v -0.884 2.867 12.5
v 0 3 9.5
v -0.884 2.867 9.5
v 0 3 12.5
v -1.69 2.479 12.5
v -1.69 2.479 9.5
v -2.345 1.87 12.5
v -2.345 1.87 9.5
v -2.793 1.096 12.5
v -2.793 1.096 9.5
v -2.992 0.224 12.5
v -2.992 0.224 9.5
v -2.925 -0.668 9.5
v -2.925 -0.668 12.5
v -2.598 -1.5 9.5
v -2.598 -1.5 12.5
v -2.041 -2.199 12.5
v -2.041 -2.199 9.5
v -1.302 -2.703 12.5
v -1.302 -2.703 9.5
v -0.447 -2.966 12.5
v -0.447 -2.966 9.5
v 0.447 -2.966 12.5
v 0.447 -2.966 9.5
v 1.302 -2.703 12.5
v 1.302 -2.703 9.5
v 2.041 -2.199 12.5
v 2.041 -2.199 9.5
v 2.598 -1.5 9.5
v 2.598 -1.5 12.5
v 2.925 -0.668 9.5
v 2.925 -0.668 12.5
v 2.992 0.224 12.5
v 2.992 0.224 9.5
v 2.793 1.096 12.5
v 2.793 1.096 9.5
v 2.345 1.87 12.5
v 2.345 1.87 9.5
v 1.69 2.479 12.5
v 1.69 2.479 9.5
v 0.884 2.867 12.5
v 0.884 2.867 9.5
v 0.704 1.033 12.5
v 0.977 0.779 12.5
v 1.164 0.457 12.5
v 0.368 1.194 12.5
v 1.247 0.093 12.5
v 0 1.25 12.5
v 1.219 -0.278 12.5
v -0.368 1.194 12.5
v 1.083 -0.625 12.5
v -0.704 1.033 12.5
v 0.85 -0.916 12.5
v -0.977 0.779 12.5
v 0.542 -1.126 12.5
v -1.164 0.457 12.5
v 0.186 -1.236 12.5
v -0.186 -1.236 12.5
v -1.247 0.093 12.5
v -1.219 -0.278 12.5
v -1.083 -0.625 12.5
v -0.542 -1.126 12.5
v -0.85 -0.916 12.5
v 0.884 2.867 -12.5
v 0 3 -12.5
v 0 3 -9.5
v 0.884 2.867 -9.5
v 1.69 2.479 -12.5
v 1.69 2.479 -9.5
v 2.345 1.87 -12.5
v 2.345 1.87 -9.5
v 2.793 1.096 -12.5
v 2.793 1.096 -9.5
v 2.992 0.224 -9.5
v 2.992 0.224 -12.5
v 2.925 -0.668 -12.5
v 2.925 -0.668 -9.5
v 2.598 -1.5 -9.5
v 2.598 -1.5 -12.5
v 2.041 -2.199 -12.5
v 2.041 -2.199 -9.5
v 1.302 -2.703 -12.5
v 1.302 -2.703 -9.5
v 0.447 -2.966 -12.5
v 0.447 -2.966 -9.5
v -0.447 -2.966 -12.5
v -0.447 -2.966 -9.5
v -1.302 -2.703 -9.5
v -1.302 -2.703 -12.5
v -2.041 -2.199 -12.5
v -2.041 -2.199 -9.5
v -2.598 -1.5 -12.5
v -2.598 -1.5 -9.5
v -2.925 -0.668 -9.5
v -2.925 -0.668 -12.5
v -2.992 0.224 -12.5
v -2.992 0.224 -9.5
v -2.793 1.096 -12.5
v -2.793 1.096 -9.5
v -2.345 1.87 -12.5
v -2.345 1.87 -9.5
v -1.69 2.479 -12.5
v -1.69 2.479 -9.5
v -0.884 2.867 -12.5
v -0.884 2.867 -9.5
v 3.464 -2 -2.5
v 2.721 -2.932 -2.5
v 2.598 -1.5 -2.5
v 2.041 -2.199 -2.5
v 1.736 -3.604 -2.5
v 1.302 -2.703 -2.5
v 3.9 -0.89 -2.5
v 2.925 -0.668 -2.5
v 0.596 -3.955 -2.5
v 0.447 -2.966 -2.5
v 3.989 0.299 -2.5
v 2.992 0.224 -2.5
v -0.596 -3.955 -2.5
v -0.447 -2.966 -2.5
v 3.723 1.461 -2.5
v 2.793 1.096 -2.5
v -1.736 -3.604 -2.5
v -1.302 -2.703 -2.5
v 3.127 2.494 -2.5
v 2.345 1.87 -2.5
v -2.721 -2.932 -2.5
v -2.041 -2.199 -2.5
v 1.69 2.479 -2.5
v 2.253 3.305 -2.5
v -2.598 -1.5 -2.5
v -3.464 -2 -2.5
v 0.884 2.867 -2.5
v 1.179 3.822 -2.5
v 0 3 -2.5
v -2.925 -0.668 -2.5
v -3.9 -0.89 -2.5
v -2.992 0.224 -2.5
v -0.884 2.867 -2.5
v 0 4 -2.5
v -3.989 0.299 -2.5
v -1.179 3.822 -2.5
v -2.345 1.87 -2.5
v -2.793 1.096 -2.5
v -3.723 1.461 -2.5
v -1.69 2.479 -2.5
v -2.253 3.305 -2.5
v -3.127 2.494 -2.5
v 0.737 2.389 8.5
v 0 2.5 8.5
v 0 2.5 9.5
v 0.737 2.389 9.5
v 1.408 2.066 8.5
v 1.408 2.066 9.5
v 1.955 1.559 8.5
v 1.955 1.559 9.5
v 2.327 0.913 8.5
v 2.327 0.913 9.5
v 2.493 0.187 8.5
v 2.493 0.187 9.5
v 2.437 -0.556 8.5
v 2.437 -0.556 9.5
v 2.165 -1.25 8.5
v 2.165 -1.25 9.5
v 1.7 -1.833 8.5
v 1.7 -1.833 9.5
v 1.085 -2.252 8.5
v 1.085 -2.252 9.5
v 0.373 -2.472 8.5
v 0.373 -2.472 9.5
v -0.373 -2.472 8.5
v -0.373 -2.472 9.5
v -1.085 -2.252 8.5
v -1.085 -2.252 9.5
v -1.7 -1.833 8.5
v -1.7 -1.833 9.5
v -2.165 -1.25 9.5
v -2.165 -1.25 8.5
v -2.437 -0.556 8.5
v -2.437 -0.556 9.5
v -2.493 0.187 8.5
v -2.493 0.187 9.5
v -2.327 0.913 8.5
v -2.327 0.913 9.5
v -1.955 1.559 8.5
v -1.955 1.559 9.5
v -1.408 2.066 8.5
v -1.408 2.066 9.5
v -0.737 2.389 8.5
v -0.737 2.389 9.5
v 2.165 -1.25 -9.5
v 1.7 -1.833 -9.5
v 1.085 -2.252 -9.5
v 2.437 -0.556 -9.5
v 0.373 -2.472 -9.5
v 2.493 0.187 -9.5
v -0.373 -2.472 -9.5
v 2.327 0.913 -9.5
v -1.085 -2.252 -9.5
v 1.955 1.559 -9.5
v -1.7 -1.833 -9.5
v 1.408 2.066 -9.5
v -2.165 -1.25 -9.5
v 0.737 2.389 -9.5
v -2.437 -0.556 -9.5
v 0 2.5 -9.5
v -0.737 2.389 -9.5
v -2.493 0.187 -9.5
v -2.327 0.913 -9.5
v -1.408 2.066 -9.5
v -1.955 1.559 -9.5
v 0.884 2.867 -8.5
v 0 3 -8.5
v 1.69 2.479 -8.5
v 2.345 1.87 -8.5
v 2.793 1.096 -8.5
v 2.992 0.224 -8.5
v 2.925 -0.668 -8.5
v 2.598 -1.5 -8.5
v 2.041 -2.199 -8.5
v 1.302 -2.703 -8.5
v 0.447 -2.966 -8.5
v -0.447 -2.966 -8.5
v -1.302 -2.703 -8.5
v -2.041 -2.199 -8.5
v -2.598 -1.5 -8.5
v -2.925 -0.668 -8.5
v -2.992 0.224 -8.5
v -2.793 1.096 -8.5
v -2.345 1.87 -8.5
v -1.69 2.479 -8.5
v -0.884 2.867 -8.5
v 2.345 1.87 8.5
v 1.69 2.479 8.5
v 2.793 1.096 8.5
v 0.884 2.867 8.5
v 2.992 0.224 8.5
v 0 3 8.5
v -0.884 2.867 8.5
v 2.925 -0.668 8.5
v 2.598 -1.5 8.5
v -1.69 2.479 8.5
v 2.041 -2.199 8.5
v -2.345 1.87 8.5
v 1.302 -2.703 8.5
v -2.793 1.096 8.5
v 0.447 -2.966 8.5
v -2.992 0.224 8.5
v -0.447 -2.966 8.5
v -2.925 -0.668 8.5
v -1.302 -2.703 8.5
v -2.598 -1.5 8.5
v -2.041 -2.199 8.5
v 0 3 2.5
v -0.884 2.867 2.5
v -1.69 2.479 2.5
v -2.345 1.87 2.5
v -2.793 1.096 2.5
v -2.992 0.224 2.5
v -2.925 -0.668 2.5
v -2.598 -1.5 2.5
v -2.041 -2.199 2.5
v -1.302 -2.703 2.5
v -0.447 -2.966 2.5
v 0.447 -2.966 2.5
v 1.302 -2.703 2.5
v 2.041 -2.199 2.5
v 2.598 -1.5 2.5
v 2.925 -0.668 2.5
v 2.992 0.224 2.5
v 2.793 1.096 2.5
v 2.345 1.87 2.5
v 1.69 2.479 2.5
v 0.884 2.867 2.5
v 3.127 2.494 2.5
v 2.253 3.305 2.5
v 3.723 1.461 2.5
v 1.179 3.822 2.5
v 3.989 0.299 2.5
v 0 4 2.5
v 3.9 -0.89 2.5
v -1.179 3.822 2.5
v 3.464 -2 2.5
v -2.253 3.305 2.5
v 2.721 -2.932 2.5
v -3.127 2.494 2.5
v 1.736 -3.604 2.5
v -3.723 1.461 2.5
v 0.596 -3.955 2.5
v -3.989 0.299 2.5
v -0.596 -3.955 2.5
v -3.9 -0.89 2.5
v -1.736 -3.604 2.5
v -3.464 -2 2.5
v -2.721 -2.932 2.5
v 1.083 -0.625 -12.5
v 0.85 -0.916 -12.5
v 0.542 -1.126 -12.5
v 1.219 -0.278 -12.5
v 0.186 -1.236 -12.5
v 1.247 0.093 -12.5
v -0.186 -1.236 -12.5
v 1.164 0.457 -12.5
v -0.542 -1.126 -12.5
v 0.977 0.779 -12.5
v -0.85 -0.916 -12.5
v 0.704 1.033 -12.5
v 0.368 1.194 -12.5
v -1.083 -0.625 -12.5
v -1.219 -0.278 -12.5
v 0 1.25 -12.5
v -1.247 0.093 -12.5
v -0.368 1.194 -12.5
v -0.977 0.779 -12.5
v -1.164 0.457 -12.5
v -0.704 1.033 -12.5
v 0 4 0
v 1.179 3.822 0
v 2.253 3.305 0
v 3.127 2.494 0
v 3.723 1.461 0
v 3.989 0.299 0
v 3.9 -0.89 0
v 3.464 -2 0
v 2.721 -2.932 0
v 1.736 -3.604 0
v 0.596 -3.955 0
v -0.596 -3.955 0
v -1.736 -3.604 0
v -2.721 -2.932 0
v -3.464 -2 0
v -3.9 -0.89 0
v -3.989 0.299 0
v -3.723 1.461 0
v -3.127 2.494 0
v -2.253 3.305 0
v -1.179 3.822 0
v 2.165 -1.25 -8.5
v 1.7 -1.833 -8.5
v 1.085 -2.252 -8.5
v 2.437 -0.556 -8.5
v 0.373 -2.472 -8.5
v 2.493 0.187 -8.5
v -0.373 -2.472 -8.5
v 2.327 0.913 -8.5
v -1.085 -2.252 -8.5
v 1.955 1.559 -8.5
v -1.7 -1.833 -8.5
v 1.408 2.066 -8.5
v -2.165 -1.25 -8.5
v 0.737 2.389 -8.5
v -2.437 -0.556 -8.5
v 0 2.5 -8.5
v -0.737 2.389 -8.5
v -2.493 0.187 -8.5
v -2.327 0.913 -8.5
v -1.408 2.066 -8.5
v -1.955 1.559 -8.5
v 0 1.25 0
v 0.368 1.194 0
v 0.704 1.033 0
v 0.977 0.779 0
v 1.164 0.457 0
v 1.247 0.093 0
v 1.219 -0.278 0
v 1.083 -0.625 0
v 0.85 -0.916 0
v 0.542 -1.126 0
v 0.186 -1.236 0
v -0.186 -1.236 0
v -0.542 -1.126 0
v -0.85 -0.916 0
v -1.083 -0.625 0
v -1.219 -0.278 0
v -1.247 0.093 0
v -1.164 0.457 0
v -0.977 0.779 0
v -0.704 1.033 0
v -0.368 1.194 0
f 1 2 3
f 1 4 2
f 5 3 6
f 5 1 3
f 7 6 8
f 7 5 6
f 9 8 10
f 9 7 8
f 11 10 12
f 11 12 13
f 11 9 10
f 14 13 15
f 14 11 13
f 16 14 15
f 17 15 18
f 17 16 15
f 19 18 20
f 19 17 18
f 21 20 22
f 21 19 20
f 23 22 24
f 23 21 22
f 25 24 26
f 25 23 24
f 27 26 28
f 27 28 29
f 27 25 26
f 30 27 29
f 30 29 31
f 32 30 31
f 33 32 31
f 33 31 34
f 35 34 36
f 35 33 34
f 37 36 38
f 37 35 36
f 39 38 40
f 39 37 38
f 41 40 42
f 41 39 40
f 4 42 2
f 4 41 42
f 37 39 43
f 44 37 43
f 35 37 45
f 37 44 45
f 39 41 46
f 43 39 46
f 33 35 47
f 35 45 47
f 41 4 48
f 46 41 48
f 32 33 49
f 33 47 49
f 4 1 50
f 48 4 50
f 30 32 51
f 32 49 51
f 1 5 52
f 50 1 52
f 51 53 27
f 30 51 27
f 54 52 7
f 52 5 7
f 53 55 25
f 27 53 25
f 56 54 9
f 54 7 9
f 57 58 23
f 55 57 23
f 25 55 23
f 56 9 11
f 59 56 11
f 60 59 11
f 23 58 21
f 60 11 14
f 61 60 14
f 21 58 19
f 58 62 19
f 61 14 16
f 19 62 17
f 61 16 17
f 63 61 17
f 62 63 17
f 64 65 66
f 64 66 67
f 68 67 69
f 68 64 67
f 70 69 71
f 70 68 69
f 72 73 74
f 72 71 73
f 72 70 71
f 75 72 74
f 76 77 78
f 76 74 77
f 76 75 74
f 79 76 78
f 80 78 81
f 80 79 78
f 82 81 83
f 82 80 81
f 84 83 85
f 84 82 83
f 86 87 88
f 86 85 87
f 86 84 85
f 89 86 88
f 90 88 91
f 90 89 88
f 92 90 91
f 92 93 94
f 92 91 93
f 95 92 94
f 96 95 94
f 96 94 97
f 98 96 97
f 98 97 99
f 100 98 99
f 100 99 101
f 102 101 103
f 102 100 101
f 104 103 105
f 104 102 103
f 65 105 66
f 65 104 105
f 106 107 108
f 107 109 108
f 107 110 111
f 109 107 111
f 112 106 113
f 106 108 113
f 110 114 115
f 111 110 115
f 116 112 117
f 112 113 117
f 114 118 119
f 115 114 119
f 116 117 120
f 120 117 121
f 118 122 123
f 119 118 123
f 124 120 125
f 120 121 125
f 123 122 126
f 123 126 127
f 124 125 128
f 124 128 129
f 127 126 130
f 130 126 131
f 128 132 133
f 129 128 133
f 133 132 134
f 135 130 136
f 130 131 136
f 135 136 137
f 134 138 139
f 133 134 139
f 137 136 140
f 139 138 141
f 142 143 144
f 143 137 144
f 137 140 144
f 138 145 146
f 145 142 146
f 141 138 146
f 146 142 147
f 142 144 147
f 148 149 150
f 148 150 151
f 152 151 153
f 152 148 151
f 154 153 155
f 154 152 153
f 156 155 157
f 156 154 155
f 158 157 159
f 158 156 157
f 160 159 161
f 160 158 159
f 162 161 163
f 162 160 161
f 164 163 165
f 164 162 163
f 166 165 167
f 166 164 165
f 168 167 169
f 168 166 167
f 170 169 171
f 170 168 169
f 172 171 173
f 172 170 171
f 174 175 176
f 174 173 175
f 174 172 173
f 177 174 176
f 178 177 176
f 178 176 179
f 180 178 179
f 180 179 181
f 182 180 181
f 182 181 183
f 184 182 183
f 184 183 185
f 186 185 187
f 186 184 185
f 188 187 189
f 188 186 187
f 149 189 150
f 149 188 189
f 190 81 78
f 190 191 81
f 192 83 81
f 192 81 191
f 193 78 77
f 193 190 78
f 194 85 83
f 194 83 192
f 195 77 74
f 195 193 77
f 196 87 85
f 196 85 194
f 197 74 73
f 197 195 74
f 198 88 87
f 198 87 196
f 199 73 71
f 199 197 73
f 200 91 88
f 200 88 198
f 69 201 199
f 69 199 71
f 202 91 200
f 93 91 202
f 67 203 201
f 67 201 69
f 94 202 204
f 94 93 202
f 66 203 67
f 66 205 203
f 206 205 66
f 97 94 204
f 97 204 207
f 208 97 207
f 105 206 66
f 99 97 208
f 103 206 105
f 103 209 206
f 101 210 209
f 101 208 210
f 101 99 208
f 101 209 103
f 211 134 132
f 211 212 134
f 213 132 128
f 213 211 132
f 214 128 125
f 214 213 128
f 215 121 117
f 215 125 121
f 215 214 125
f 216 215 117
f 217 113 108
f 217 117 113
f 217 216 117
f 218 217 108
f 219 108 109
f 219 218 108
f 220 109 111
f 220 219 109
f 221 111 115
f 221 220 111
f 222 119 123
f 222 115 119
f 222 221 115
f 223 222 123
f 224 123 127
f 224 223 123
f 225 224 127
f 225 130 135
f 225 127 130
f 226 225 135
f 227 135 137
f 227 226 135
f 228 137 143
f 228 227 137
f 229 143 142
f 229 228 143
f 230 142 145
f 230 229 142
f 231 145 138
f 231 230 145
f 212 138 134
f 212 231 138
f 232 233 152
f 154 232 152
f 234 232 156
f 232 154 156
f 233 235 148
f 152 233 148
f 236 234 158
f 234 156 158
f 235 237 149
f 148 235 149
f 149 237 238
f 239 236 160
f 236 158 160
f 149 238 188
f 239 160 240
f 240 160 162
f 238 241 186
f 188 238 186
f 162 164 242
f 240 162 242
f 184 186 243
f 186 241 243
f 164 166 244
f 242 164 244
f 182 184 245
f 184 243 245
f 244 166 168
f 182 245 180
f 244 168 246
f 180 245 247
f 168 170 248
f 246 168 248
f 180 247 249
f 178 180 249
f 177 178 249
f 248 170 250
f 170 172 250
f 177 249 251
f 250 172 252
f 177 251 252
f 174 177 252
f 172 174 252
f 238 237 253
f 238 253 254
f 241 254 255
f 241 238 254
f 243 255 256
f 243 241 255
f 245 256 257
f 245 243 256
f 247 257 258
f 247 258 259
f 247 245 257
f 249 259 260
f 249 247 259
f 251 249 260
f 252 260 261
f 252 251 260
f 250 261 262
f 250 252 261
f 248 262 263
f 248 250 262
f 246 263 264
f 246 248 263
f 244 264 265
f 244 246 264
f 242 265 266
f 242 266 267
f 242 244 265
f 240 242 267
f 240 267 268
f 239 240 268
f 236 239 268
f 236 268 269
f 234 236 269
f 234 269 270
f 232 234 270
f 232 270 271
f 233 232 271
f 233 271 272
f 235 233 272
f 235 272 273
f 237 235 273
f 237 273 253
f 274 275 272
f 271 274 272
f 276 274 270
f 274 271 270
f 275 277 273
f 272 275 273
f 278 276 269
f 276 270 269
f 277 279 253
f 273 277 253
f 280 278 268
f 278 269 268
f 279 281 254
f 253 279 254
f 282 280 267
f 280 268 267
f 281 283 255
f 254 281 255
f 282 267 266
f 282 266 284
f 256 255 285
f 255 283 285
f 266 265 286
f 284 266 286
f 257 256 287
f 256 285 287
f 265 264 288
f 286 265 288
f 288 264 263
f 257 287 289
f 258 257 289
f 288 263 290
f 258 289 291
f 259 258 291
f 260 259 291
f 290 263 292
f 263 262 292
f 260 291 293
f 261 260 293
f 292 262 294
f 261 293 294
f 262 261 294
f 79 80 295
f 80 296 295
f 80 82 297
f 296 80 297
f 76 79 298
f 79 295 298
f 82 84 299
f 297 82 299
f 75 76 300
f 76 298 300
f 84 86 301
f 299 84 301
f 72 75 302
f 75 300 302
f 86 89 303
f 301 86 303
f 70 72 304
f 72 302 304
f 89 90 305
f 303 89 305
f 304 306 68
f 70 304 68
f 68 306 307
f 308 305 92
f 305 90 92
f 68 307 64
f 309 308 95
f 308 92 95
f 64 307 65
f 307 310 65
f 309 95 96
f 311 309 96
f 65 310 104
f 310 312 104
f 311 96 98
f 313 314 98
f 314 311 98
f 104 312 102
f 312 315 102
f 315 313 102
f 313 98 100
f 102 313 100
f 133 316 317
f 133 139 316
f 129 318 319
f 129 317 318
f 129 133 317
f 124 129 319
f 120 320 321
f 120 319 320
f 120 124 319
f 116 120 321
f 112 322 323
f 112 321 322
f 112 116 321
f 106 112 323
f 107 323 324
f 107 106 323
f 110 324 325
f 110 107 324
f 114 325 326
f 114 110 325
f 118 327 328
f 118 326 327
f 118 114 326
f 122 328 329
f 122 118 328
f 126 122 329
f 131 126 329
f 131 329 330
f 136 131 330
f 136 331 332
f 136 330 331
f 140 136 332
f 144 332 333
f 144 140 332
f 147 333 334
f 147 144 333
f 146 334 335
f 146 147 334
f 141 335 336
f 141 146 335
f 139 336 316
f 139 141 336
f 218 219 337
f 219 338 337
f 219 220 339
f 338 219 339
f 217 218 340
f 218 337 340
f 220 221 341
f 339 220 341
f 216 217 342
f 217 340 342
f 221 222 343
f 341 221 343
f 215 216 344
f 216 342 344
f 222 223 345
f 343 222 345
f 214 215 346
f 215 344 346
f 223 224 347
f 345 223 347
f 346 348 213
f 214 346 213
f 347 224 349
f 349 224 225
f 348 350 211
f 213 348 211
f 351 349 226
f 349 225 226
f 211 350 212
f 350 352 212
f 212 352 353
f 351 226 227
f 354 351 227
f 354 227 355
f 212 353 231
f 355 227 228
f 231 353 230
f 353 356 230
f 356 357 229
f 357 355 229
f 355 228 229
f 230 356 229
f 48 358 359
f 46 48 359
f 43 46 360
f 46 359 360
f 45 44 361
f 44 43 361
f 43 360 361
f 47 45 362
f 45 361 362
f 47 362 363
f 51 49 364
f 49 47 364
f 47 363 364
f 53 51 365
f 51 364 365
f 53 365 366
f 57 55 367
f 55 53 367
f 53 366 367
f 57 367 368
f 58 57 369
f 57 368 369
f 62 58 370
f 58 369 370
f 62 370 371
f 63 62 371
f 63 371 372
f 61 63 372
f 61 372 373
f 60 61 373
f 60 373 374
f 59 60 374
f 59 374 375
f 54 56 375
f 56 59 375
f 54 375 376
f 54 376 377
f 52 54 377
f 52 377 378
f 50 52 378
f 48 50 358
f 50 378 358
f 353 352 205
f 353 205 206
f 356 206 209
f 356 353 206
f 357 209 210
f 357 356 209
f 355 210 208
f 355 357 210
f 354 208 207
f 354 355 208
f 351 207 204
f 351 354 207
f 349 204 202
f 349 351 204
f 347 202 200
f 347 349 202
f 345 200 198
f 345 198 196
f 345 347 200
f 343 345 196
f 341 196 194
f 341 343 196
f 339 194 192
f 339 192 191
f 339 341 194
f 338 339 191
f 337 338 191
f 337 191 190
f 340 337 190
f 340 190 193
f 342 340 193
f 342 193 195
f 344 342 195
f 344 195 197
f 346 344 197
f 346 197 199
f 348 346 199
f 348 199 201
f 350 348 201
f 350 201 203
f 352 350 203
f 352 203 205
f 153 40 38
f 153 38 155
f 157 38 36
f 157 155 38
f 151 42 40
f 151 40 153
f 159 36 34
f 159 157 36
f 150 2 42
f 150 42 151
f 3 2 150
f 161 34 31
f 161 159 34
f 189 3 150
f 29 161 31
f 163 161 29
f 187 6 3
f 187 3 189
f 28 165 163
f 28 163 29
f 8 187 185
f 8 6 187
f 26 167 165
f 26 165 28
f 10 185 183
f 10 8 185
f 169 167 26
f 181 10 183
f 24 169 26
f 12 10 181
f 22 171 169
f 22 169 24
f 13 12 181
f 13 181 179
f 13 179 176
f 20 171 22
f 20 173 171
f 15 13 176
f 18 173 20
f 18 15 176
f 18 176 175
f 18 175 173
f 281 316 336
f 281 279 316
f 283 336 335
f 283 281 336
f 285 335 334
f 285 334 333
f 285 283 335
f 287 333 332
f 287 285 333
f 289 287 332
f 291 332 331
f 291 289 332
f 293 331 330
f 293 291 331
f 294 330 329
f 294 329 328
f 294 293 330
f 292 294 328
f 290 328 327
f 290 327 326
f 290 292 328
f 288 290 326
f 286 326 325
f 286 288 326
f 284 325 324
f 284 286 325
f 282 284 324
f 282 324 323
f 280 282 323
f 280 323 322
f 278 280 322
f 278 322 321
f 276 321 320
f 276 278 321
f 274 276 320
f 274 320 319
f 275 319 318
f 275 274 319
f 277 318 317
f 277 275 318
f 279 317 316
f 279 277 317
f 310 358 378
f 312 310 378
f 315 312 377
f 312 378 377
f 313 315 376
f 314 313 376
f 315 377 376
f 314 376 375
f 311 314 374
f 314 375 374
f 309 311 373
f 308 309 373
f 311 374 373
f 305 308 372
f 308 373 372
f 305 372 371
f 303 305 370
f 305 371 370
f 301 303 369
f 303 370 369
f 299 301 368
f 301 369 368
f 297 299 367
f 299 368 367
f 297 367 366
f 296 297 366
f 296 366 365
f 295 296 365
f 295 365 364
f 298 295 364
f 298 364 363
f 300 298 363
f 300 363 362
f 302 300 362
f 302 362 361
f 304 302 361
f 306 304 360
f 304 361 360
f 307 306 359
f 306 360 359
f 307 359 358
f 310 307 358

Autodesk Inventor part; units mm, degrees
ref_plane "YZ Plane" through (0, 0, 0) normal (1, 0, 0) x (0, 1, 0)
ref_plane "XZ Plane" through (0, 0, 0) normal (0, 1, 0) x (-1, 0, 0)
ref_plane "XY Plane" through (0, 0, 0) normal (0, 0, 1) x (1, 0, 0)
sketch "スケッチ2" plane through (0, 0, 0) normal (1, 0, 0) x (0, 1, 0)
  line L0 (2.5, -8.5) -> (3, -8.5)
  line L1 (3, -9.5) -> (2.5, -9.5)
  line L2 (2.5, -9.5) -> (2.5, -8.5)
  line L3 (3, -9.5) -> (3, -12.5)
  line L4 (3, -12.5) -> (1.25, -12.5)
  line L5 (1.25, -12.5) -> (1.25, 0)
  line L6 (1.25, 0) -> (4, 0)
  line L7 (4, 0) -> (4, -2.5)
  line L8 (4, -2.5) -> (3, -2.5)
  line L9 (3, -2.5) -> (3, -8.5)
  line L10 (0, -15) -> (0, 2.5) projected
  point P0 (0, 0)
  dimension "d3" = 8.5
  dimension "d4" = 1
  dimension "d5" = 2.5
  dimension "d6" = 1.25
  dimension "d8" = 4
  dimension "d9" = 2.5
  dimension "d10" = 3
  dimension "d11" = 12.5
revolve "回転1" add sketch "スケッチ2" angle 360 about axis through (0, 0, -10) along (0, 0, 1)
mirror "ミラー1" about plane through (0, 4, 0) normal (0, 0, 1) of "回転1"
sketch "スケッチ1" plane through (0, 0, 0) normal (0, 0, 1) x (1, 0, 0)
  circle A0 centre (0, 0) radius 4
  dimension "d0" = 8
properties part number "下側ベアリング軸" material "アルミニウム 2014-T4"
